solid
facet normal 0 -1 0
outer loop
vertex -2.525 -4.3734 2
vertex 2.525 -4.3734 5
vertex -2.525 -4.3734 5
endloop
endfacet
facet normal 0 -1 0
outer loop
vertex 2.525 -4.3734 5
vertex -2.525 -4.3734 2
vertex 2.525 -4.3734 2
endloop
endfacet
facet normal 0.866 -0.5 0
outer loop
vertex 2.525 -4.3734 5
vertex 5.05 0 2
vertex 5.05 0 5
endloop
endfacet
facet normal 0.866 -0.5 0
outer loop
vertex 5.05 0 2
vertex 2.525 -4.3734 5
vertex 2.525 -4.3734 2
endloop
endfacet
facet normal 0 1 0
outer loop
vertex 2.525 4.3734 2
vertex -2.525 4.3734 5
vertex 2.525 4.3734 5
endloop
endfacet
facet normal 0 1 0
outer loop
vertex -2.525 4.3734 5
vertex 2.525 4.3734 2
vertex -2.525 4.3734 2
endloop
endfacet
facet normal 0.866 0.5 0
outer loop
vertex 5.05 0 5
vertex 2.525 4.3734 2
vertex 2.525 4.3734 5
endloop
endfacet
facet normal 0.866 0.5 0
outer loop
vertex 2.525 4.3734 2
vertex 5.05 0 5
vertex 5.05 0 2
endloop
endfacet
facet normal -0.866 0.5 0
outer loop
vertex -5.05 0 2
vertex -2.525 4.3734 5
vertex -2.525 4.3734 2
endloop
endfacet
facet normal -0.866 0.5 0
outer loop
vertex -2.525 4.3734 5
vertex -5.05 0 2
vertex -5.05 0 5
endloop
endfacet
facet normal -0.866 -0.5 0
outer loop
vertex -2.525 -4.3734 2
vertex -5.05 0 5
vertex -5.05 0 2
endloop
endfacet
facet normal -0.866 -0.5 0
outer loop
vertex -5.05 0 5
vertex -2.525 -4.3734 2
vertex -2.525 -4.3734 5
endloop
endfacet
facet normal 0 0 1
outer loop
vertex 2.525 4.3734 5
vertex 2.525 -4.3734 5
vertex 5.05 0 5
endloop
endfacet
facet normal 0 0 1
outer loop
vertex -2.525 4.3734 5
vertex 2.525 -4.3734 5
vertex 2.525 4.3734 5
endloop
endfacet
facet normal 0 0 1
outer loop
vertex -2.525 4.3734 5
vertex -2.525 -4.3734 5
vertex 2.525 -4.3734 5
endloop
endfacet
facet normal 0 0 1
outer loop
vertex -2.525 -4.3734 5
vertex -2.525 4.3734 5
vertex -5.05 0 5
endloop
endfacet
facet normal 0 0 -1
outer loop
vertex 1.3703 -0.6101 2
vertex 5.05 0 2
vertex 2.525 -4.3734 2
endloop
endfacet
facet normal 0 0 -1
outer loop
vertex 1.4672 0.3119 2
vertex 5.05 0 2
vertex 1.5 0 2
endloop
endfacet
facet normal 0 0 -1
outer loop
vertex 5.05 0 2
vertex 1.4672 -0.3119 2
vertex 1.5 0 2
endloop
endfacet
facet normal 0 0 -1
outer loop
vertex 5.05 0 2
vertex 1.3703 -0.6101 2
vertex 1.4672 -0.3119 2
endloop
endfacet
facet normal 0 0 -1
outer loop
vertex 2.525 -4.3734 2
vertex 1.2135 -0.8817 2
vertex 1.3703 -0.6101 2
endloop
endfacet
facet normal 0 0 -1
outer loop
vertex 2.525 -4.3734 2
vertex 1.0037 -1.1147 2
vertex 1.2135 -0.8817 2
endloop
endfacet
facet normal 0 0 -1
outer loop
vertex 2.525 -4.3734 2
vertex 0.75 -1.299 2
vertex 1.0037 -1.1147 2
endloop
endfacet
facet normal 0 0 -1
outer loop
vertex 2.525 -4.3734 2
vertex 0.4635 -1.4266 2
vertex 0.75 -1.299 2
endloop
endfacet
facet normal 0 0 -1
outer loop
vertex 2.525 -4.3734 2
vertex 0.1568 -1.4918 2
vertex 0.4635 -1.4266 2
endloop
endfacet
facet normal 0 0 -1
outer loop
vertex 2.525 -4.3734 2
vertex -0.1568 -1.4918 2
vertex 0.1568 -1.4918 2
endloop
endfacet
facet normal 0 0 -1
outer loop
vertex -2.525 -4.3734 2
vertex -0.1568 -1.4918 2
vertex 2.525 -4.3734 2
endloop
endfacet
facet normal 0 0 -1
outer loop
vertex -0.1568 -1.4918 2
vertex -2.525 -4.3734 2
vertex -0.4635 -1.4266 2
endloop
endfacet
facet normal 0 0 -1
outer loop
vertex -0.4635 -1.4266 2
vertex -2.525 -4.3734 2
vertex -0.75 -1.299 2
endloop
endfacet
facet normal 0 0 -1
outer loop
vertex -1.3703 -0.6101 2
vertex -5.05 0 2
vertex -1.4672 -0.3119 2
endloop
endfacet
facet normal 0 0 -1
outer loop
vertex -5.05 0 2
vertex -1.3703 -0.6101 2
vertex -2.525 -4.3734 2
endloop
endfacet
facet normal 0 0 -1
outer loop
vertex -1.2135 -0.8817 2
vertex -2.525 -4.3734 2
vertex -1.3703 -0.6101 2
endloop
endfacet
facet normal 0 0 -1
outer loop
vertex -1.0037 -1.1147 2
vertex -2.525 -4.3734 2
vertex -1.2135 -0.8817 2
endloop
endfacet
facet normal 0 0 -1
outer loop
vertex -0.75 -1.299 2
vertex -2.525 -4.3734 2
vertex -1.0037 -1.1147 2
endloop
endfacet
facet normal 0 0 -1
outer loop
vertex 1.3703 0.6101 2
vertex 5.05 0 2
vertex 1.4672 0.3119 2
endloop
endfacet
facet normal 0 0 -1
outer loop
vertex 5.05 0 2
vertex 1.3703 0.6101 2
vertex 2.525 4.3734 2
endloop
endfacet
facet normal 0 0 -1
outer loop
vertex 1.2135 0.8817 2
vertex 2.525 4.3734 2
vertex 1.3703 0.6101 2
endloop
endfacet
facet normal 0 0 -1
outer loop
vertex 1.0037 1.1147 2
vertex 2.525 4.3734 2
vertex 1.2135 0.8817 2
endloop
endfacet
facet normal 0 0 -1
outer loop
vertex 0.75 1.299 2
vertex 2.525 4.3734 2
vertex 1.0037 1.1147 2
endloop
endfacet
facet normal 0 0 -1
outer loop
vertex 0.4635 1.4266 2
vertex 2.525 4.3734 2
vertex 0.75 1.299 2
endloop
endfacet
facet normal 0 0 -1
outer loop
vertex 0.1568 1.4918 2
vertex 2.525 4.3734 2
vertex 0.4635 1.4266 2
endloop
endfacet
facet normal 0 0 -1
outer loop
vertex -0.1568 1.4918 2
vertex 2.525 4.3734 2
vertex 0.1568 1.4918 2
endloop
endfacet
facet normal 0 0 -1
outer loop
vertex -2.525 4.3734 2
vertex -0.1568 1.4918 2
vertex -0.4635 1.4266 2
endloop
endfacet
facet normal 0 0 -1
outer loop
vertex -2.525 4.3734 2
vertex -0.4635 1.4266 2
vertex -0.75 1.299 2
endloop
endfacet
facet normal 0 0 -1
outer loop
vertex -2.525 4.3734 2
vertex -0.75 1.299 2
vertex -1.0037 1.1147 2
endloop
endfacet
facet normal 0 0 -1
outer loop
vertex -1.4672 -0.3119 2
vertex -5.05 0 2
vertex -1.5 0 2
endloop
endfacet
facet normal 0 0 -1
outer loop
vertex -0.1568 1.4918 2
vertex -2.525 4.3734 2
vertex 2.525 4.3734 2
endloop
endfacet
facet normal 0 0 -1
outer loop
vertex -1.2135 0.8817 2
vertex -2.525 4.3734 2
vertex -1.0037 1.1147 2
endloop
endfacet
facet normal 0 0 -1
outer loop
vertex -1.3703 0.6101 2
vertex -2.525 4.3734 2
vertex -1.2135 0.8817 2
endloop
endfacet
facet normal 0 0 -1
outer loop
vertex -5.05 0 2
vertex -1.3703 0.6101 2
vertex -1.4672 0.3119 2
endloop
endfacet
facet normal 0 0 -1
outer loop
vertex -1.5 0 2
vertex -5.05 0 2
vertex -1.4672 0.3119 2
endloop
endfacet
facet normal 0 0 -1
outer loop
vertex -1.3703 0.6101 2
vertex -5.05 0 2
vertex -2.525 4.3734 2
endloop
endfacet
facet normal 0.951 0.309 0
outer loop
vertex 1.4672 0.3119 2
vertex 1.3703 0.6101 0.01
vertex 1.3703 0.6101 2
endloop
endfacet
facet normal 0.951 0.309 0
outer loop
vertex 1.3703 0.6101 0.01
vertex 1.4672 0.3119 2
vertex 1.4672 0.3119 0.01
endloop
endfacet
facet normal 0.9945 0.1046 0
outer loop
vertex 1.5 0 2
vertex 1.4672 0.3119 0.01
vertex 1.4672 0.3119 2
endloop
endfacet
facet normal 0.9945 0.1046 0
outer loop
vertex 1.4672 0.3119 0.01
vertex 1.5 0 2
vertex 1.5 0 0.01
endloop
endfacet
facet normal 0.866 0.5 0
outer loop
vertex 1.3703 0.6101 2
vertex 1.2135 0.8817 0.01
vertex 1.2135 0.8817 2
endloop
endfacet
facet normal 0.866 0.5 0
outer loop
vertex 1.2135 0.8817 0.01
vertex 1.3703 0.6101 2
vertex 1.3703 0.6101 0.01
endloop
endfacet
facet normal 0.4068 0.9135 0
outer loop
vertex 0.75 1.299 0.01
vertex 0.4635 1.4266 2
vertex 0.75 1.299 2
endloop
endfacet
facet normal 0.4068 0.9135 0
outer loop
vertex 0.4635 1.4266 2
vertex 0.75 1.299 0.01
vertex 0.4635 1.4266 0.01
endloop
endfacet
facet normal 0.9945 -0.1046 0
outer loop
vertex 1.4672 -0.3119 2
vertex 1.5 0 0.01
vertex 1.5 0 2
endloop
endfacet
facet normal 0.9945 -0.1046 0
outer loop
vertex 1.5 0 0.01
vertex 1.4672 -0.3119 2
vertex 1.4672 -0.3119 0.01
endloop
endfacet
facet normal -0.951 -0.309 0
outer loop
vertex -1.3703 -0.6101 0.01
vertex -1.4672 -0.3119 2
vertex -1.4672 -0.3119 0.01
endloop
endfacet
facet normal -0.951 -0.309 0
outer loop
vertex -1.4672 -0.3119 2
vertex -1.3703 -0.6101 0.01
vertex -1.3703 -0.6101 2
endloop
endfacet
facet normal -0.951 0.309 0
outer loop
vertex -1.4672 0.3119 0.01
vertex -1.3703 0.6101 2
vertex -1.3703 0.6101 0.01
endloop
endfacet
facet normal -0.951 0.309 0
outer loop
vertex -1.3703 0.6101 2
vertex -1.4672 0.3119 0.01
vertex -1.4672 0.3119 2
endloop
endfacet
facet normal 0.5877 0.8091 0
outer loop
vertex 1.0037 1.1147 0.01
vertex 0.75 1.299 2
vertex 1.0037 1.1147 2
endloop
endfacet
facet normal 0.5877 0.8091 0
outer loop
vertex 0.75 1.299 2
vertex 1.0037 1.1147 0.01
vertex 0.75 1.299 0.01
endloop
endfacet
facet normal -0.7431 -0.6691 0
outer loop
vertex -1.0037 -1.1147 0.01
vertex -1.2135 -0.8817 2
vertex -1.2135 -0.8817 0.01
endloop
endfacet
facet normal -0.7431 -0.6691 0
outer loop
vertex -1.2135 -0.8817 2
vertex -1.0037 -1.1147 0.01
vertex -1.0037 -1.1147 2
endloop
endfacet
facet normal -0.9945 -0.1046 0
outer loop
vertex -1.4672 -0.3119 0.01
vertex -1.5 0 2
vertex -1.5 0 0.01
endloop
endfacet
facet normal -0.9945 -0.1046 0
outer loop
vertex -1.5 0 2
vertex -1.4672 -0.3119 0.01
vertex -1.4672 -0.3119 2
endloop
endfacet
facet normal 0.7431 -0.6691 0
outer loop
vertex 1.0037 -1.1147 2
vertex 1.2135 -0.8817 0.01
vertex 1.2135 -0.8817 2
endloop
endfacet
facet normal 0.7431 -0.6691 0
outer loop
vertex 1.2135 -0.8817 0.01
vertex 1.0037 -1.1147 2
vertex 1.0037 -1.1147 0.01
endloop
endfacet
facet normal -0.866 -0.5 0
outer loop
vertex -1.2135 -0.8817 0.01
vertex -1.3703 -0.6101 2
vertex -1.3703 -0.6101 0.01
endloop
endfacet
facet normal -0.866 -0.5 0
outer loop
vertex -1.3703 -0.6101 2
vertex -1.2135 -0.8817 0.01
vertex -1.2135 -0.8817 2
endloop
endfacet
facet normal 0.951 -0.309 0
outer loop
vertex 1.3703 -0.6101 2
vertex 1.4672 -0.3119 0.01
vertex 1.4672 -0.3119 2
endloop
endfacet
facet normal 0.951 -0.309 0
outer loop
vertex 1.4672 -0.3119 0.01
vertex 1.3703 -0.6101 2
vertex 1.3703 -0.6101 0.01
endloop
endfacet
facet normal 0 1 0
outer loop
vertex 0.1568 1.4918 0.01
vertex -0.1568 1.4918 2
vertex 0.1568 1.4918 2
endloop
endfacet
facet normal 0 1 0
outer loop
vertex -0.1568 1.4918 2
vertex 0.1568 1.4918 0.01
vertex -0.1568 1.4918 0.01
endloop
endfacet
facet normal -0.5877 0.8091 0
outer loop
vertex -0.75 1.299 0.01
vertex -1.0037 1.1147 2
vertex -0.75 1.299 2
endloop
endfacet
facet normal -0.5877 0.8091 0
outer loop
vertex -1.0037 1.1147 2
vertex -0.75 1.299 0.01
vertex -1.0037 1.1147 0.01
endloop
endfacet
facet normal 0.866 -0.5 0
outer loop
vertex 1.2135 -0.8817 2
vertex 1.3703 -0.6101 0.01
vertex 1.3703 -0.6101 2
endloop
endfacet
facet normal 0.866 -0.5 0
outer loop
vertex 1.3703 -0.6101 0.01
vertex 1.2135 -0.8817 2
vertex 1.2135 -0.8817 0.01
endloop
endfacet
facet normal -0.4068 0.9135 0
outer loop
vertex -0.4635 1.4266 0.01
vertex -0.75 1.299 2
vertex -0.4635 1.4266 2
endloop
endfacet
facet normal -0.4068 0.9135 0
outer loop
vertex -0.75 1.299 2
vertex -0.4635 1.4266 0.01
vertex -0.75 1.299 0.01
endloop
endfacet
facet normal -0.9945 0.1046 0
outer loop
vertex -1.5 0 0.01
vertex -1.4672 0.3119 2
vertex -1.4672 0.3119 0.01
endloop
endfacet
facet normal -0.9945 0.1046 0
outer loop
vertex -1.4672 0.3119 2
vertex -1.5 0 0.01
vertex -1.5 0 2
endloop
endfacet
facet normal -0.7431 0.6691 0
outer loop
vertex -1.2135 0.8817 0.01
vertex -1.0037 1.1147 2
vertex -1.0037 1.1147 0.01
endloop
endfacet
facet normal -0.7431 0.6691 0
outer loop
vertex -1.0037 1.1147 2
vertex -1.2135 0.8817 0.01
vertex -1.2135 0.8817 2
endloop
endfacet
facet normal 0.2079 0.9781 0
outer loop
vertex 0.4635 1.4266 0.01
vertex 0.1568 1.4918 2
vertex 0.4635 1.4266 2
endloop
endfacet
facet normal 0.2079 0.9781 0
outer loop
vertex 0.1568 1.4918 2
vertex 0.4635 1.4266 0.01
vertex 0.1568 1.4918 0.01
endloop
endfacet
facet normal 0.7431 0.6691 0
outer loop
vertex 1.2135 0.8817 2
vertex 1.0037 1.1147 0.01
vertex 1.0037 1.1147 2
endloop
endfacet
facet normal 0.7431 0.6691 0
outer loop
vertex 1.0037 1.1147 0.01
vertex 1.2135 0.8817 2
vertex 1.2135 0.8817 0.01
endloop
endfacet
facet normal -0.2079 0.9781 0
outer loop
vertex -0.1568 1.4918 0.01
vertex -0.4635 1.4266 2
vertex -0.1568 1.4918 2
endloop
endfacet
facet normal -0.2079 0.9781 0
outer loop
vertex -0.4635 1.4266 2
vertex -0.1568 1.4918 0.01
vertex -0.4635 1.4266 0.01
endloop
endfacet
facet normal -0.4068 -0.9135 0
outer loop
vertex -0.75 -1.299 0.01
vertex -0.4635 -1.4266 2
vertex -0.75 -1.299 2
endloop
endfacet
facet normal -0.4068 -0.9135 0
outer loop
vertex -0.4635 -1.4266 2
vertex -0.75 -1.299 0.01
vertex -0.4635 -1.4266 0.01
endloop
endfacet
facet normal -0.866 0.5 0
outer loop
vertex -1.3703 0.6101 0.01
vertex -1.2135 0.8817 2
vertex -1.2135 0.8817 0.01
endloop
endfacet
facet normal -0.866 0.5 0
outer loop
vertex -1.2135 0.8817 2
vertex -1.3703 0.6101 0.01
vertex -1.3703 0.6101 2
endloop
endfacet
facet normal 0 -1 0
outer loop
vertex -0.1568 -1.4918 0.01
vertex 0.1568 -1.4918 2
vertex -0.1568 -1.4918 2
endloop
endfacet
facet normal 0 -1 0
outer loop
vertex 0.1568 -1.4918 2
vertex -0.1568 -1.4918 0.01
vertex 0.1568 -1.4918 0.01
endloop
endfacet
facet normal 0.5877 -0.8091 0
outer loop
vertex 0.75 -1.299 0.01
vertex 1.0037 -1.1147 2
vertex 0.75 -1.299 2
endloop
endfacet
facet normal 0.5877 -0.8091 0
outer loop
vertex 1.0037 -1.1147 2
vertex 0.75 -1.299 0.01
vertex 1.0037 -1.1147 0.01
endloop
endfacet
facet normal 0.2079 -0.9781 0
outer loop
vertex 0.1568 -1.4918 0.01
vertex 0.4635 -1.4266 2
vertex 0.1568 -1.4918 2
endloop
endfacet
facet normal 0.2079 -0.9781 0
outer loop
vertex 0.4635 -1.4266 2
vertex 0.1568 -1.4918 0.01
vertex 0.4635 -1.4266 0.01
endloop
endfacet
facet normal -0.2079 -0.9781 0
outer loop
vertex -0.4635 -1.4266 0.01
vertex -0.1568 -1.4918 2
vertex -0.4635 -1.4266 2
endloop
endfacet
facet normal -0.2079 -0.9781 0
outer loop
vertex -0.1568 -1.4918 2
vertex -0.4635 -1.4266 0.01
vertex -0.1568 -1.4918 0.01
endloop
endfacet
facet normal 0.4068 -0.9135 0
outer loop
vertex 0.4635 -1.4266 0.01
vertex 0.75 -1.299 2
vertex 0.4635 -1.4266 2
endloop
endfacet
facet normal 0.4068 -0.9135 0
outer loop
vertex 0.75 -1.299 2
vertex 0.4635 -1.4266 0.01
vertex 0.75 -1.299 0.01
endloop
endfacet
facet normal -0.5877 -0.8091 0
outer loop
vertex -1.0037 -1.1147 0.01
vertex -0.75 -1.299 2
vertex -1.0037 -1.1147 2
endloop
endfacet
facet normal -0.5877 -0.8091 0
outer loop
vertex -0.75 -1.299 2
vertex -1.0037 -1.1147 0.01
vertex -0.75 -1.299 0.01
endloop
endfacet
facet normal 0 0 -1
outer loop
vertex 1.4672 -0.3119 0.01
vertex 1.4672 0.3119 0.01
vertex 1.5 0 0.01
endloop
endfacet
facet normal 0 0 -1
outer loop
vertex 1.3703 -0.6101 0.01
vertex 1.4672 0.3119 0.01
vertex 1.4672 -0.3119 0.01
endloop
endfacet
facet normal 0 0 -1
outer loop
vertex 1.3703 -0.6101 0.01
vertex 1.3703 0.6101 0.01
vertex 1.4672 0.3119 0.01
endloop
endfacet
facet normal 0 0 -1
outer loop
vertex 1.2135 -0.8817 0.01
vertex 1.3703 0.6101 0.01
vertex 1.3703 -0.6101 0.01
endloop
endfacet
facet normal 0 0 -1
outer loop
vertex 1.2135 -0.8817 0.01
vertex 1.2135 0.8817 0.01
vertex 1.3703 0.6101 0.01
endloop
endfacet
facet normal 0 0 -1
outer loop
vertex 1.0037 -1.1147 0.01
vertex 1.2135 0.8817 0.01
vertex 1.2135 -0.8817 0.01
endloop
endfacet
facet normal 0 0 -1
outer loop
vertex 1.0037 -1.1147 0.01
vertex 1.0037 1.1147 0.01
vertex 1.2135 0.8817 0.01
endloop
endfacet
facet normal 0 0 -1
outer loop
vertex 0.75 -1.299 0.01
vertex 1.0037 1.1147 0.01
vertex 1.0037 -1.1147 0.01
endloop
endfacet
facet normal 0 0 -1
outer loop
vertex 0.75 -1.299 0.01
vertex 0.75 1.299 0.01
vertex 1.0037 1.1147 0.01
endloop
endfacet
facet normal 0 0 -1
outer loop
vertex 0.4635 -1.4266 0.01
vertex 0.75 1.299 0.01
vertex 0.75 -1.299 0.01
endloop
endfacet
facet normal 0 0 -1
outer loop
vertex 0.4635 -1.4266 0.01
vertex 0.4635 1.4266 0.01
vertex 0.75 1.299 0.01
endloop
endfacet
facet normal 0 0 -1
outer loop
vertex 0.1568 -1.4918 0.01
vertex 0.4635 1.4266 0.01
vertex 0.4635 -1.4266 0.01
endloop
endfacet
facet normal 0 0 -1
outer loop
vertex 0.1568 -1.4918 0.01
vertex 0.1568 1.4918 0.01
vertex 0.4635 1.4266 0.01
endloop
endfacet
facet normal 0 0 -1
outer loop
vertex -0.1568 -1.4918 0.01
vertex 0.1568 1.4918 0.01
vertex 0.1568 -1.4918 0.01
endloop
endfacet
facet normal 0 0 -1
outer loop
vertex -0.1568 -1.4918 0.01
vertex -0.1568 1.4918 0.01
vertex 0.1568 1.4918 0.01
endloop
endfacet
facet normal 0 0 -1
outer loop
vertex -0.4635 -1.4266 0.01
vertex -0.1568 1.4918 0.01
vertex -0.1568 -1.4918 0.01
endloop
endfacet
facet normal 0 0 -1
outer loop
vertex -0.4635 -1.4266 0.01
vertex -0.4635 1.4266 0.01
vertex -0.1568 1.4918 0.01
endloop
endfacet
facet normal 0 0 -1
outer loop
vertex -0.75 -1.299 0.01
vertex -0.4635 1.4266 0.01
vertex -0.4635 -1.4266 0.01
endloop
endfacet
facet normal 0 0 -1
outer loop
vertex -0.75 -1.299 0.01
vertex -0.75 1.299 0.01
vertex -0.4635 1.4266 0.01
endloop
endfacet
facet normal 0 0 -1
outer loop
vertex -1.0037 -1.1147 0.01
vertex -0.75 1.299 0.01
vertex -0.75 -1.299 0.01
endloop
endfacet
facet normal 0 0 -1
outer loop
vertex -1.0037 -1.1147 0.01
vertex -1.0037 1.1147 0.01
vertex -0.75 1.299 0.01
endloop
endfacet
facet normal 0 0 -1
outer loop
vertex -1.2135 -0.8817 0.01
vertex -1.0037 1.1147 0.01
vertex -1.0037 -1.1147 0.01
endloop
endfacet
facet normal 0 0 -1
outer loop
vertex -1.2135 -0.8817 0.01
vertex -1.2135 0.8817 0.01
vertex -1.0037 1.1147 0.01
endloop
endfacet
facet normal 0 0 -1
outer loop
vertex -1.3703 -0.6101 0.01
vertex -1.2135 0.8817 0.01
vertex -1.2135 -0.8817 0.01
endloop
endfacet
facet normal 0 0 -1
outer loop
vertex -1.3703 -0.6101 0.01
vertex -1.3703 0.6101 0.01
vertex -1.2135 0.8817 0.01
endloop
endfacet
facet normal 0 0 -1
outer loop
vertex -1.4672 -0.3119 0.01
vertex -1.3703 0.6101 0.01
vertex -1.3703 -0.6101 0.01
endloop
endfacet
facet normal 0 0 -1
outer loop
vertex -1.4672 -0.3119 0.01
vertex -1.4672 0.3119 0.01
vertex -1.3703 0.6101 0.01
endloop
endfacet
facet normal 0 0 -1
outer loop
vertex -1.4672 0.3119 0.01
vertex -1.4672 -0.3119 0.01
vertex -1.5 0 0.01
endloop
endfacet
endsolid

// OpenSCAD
module hex_nut_hole(nut_height = 3,
                    span = 10,         // Width of nut
                    bolt_diameter = 3,
                    hole_depth = 5,
                    self_tapping = false) {
   // Allow for self-tapping if required
   bolt_hole_diameter = (self_tapping == true) ? 0.7 * bolt_diameter : bolt_diameter;

   // If the hole depth required is deeper than the countersink, we need an extra straight part.
   straight_part_depth = hole_depth - nut_height;
   assert(straight_part_depth >= 0);

   epsilon = 0.01;
   nudge_amount = 0.1; // Should allow for a nice push-fit.
   union() {
      // hex shaped hole
      translate([0, 0, straight_part_depth]) {
         cylinder(h = nut_height, d = span + nudge_amount, $fn=6);
      }
      // bolt hole
      translate([0, 0, epsilon]) {
         cylinder(r = bolt_hole_diameter / 2, h = straight_part_depth + epsilon);
      }
   }
}

module hex_nut_hole_m3(hole_depth = 5) {
   hex_nut_hole(nut_height = 3,
                span = 6,
                bolt_diameter = 3,
                hole_depth = hole_depth,
                self_tapping = false);
}

// Test code
$fs = 0.15;
hex_nut_hole();
